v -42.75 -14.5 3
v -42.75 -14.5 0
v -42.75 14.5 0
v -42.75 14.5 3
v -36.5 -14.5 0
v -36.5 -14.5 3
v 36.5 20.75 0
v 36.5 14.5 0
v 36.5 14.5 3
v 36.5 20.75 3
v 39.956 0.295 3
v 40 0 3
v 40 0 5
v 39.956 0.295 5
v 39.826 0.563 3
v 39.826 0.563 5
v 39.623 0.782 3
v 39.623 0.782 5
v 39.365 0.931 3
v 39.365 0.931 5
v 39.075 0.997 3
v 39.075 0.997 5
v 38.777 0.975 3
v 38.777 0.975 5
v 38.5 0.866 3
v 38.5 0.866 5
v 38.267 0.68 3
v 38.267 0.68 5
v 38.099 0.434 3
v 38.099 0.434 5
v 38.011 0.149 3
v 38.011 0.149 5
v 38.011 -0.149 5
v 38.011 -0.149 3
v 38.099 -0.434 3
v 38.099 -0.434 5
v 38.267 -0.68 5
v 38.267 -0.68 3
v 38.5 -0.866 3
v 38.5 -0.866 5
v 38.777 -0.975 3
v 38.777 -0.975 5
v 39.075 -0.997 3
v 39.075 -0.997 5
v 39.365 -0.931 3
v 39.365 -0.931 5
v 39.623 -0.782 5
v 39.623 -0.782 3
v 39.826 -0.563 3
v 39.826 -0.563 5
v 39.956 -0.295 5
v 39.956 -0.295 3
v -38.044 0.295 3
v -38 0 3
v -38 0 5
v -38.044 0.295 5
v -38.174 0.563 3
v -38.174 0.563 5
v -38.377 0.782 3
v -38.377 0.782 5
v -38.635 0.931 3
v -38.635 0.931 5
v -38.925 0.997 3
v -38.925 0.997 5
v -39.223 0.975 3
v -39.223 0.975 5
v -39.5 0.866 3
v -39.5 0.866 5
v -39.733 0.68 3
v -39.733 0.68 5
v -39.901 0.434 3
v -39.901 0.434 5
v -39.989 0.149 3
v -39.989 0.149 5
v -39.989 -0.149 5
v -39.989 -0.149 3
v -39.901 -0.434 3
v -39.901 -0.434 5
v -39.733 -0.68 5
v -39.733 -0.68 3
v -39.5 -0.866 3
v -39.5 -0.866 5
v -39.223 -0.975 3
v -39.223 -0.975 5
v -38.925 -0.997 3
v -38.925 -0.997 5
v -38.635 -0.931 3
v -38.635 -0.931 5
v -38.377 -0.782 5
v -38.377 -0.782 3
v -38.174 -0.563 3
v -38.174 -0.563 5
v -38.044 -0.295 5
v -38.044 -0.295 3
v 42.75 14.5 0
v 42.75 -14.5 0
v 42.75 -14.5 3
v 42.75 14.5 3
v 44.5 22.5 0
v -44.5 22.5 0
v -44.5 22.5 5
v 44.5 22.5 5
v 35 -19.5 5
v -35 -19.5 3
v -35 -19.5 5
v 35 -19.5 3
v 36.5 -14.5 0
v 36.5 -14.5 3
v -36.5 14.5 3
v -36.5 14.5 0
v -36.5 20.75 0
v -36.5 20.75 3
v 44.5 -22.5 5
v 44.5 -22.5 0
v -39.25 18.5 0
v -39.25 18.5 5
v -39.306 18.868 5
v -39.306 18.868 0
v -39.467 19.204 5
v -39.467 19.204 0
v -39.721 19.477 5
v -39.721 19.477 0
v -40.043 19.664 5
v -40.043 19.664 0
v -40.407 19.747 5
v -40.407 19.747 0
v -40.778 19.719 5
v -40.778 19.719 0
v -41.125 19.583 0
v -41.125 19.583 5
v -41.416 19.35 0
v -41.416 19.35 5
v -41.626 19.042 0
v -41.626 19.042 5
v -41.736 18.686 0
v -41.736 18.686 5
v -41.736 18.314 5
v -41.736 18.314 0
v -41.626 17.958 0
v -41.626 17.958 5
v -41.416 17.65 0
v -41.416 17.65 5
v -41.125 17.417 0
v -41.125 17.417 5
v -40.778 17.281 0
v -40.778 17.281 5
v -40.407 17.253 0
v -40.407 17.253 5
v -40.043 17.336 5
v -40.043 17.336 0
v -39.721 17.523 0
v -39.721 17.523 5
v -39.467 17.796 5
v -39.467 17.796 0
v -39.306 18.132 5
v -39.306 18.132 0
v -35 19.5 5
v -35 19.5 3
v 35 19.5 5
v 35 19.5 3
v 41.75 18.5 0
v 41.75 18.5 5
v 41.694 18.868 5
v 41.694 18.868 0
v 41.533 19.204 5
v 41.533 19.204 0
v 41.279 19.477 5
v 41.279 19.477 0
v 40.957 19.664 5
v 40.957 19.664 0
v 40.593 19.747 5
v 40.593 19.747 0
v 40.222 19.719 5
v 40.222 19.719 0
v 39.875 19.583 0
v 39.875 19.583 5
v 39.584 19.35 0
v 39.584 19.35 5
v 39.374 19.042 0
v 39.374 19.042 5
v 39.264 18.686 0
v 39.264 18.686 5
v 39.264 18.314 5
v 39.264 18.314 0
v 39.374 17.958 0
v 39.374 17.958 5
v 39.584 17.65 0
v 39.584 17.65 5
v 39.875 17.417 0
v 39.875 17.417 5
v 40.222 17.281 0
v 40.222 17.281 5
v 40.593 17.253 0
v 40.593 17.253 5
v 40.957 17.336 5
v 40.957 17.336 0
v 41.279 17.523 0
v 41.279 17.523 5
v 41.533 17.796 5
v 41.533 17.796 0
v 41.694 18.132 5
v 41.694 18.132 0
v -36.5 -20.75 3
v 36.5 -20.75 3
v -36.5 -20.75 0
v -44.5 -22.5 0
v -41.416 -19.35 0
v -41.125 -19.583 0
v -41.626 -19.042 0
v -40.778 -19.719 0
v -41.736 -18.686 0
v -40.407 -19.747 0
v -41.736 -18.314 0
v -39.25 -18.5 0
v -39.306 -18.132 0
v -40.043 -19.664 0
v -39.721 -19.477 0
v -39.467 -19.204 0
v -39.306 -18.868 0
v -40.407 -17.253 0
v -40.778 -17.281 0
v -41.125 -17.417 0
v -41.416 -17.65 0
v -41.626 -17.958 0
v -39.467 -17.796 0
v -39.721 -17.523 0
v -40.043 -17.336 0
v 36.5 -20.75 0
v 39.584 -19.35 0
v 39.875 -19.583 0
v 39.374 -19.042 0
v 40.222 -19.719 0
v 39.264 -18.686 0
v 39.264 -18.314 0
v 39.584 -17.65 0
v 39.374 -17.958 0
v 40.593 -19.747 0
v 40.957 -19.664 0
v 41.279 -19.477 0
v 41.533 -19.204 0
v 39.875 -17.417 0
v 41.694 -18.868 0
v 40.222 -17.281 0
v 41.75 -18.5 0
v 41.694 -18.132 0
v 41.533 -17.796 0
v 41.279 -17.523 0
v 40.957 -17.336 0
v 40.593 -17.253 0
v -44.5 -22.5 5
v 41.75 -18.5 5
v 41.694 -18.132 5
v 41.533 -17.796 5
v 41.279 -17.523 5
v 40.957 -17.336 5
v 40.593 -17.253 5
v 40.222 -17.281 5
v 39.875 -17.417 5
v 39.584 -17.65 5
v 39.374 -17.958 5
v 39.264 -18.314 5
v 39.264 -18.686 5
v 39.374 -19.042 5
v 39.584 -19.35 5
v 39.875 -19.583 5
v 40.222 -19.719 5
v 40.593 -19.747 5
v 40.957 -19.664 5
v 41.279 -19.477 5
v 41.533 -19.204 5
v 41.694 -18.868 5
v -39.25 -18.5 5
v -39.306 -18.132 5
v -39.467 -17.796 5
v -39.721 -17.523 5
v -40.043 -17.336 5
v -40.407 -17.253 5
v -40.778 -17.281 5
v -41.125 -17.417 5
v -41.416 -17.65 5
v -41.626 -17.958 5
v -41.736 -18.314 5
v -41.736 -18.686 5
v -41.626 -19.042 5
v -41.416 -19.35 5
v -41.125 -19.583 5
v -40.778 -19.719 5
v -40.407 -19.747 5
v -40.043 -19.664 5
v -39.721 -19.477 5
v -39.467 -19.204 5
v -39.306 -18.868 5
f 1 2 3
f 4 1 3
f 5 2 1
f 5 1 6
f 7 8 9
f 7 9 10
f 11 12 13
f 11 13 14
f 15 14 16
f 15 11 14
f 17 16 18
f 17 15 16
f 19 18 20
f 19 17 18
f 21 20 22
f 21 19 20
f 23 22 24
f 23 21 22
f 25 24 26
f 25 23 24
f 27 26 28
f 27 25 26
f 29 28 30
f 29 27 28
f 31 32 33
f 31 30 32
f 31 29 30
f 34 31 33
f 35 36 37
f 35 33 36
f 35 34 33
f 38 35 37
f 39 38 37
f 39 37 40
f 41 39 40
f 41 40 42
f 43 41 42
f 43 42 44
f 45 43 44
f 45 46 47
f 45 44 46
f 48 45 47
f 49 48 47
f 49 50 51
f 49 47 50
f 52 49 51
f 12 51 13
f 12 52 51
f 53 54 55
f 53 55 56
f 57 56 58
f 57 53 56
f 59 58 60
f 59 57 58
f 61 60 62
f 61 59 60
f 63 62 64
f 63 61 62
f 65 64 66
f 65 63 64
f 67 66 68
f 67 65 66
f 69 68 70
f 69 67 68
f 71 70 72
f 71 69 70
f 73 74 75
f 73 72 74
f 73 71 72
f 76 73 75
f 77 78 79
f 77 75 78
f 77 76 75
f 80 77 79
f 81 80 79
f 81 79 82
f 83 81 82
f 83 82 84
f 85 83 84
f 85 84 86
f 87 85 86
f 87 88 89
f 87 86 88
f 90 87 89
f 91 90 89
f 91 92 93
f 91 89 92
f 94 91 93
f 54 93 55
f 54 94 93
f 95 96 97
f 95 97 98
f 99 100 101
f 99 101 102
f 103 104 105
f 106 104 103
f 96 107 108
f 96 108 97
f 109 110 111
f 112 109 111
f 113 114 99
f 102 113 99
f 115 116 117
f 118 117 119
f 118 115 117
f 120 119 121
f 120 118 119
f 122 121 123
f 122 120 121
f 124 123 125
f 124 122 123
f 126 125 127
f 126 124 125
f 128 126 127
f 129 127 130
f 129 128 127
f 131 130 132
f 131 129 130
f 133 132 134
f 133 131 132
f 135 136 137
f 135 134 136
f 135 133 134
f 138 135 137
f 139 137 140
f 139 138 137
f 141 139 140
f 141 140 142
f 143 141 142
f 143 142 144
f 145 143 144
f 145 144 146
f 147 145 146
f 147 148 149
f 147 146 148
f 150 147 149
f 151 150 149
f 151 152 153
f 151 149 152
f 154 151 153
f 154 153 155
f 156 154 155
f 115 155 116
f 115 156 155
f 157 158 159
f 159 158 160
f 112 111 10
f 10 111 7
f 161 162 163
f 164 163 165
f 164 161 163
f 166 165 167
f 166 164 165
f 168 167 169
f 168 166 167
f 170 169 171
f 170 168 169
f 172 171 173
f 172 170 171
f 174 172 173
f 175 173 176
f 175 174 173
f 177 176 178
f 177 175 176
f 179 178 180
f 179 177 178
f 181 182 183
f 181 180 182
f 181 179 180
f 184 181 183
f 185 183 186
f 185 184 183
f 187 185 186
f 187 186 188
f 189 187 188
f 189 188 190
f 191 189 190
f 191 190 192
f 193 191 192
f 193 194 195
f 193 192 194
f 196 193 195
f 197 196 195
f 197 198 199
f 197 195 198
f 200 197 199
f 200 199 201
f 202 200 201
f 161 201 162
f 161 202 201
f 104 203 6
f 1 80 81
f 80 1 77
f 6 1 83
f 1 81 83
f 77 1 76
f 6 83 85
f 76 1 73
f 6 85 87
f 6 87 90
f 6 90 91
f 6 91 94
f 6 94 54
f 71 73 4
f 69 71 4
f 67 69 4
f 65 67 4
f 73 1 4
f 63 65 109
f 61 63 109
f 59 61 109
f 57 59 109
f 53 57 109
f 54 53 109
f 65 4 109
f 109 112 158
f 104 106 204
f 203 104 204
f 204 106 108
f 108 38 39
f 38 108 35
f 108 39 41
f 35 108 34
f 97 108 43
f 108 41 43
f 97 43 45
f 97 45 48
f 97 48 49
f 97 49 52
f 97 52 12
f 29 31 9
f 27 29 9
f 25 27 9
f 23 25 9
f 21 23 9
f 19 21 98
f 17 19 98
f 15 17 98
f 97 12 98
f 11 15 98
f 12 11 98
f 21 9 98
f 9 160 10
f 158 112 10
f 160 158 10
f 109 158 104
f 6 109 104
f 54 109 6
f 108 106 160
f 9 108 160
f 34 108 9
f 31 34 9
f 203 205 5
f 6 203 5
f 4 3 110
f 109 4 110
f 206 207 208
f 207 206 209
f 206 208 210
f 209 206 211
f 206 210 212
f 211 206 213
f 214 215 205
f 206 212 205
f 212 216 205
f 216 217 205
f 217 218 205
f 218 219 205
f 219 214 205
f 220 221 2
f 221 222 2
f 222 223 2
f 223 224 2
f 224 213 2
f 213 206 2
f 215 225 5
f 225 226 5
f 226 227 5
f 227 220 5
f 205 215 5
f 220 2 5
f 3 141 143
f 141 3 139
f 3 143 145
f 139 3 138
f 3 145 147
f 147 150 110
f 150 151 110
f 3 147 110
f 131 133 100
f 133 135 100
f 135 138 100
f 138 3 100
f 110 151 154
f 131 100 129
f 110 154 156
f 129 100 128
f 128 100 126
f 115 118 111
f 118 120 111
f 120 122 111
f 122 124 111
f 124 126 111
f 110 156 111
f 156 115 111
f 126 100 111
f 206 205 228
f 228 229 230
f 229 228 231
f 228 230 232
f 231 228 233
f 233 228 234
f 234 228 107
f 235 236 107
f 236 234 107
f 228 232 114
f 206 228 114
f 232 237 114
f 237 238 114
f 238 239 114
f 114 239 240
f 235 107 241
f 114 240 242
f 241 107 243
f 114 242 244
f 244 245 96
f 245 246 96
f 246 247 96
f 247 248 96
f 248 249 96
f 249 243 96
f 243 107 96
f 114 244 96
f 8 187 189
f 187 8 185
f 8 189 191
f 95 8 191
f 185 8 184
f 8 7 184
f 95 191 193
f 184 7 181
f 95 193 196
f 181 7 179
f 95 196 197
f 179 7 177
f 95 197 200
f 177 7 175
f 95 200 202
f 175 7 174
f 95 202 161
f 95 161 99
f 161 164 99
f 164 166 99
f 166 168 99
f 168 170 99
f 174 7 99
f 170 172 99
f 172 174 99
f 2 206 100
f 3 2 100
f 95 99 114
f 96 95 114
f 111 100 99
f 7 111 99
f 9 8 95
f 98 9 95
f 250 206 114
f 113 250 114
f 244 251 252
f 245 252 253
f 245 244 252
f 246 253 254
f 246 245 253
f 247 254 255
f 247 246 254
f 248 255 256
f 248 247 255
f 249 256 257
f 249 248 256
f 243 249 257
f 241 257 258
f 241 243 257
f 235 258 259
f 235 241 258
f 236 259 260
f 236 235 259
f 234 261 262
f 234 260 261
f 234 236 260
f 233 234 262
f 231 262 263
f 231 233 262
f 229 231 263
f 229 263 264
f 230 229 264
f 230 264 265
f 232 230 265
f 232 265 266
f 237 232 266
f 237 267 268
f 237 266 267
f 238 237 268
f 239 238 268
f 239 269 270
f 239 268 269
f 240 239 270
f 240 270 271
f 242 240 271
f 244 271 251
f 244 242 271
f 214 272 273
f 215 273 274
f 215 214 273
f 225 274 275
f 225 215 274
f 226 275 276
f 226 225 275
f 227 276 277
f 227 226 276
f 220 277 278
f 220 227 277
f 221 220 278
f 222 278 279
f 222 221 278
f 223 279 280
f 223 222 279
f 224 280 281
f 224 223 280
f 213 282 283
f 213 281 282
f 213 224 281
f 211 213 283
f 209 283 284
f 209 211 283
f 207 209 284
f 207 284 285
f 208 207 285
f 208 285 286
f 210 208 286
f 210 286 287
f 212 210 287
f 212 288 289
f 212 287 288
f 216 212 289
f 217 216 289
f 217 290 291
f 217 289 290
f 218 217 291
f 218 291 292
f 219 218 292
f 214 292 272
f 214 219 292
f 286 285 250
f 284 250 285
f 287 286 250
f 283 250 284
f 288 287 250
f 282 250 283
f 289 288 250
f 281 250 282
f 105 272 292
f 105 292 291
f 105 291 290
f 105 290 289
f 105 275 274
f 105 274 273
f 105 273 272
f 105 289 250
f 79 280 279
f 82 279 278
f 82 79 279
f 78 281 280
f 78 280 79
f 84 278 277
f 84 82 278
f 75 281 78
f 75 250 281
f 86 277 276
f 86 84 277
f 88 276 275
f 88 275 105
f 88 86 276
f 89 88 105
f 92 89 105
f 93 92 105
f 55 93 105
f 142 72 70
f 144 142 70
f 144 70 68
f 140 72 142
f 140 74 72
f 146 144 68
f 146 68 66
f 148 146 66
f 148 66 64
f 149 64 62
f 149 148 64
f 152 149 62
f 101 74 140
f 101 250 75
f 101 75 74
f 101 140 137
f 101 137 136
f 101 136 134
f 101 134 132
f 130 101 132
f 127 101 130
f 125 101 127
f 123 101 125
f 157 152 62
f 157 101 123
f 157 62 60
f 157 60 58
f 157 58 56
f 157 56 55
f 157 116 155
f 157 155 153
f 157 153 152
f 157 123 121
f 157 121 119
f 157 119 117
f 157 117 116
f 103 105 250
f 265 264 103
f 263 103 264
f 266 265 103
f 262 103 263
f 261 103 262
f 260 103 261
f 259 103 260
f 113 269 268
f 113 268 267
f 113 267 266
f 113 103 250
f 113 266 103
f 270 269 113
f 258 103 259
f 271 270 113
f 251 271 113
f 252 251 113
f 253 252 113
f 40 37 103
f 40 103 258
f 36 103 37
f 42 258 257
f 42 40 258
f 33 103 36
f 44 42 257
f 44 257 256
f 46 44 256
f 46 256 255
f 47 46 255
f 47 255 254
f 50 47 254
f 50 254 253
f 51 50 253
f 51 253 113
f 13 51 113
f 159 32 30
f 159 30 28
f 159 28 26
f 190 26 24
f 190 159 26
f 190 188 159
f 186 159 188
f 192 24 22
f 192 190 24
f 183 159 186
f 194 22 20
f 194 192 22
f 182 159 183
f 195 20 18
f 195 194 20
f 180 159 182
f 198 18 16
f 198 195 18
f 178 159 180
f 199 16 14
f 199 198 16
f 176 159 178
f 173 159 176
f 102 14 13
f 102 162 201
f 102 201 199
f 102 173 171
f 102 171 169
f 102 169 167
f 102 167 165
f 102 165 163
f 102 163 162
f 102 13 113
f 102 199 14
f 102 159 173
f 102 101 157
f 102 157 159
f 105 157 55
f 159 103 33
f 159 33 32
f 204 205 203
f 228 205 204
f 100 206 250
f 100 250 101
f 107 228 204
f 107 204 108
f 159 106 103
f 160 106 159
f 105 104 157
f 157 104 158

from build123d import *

# Parameters (mm, degrees)
F0_W     = 89
F0_H     = 45
F1_DEPTH = 5
F2_W     = 70
F2_H     = 39
F3_DEPTH = 25
F4_W     = 85.5
F4_H     = 41.5
F5_DEPTH = 3
F6_W     = 8
F6_H     = 8
F7_DEPTH = 3
F8_R     = 1.25
F8_R_2   = 1
F9_DEPTH = 25


with BuildPart() as f1:
    # F0 (on Top) → F1 (new body)
    with BuildSketch(Plane.XY):
        Rectangle(F0_W, F0_H)
    extrude(amount=F1_DEPTH)

    # F2 (on Top) → F3 (cut)
    with BuildSketch(Plane.XY):
        Rectangle(F2_W, F2_H)
    extrude(amount=F3_DEPTH, mode=Mode.SUBTRACT)

    # F4 (on Top) → F5 (cut)
    with BuildSketch(Plane.XY):
        Rectangle(F4_W, F4_H)
    extrude(amount=F5_DEPTH, mode=Mode.SUBTRACT)

    # F6 (on Top) → F7 (join)
    with BuildSketch(Plane.XY):
        with Locations((-40.5, 18.5)):
            Rectangle(F6_W, F6_H)
        with Locations((-40.5, -18.5)):
            Rectangle(F6_W, F6_H)
        with Locations((40.5, 18.5)):
            Rectangle(F6_W, F6_H)
        with Locations((40.5, -18.5)):
            Rectangle(F6_W, F6_H)
    extrude(amount=F7_DEPTH)

    # F8 (on Top) → F9 (cut)
    with BuildSketch(Plane.XY):
        with Locations((40.5, -18.5)):
            Circle(F8_R)
        with Locations((40.5, 18.5)):
            Circle(F8_R)
        with Locations((-40.5, -18.5)):
            Circle(F8_R)
        with Locations((-40.5, 18.5)):
            Circle(F8_R)
        with Locations((-39, 0)):
            Circle(F8_R_2)
        with Locations((39, 0)):
            Circle(F8_R_2)
    extrude(amount=F9_DEPTH, mode=Mode.SUBTRACT)


solid = f1.part
